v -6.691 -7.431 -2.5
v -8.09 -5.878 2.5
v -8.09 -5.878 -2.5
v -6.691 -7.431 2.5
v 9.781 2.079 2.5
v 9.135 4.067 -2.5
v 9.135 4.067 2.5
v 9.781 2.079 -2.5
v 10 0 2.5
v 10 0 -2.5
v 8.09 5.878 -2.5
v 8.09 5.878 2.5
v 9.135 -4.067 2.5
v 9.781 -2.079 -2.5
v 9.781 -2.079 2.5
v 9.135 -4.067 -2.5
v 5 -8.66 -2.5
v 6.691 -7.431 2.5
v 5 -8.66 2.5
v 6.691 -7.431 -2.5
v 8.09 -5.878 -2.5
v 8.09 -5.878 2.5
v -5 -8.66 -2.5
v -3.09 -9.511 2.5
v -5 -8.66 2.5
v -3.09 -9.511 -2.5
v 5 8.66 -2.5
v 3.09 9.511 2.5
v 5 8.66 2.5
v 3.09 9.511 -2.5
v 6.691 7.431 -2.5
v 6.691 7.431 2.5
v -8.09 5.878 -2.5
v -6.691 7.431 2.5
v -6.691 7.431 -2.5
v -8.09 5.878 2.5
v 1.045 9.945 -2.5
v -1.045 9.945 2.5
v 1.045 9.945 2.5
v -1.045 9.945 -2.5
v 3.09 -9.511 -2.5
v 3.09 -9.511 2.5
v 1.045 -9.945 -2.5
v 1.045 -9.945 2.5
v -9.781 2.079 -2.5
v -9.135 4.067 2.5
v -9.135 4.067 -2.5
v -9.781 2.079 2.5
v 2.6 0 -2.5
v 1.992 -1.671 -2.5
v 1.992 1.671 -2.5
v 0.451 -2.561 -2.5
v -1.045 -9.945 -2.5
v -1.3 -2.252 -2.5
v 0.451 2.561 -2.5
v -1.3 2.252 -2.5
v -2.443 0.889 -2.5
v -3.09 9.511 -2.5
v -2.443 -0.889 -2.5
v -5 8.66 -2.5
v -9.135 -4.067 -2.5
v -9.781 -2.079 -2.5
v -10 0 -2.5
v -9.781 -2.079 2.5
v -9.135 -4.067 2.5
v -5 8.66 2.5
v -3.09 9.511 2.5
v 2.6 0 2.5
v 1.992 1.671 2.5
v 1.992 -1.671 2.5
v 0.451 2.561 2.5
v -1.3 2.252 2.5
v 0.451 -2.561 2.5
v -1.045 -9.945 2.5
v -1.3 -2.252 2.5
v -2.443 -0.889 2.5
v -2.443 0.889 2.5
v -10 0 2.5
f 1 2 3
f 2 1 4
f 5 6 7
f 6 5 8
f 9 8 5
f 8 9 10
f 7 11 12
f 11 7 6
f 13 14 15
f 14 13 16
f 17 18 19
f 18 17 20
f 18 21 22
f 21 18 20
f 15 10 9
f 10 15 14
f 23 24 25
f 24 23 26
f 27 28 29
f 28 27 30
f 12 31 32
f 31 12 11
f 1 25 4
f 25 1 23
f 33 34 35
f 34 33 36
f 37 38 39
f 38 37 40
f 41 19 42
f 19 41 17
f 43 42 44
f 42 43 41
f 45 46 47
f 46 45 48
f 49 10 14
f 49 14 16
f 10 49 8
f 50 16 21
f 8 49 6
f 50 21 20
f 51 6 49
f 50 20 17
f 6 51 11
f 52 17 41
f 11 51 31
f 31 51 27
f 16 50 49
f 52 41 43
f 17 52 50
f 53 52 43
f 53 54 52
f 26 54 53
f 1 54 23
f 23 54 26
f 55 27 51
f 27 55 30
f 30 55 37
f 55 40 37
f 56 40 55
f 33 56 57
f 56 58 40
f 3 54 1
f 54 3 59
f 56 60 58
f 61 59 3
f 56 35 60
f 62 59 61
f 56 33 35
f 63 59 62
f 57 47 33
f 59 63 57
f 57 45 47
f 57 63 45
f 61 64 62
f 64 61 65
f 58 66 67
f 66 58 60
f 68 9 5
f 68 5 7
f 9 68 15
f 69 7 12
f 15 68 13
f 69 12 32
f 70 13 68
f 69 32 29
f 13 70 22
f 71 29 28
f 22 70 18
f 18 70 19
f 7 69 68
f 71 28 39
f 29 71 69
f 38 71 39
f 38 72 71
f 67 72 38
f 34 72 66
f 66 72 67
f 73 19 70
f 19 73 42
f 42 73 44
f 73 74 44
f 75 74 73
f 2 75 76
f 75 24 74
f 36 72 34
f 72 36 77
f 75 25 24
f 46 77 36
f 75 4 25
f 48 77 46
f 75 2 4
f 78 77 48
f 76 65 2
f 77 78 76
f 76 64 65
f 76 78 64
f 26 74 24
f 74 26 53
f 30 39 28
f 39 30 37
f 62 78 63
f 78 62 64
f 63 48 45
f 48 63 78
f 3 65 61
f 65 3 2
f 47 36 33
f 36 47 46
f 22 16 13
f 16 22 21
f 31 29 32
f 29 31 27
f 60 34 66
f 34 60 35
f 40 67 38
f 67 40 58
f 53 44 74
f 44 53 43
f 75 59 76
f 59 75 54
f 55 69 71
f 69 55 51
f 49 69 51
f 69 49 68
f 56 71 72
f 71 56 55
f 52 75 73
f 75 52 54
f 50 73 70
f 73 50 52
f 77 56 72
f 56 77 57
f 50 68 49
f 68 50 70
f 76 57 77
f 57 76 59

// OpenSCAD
// Parameters
magnet_type = 0; //[0:10:1]
magnet_od = 20; //[10:40:1]
magnet_id = 5; //[0:20:1]
magnet_h = 5; //[2.5:10:0.5]
bore_clearance = 0.2; //[0:0.6:0.05]

// Magnet - complete geometry
module magnet() {
  color([0.8, 0.6, 0.2]) { // Brass-like color for the magnet
    difference() {
      // Magnet body
      cylinder(r=magnet_od/2, h=magnet_h, center=true);
      
      // Optional bore
      if (magnet_id > 0) {
        cylinder(r=(magnet_id + bore_clearance)/2, h=magnet_h + 2, center=true);
      }
    }
  }
}

// Assembly
module assembly() {
  magnet();
}

assembly();
